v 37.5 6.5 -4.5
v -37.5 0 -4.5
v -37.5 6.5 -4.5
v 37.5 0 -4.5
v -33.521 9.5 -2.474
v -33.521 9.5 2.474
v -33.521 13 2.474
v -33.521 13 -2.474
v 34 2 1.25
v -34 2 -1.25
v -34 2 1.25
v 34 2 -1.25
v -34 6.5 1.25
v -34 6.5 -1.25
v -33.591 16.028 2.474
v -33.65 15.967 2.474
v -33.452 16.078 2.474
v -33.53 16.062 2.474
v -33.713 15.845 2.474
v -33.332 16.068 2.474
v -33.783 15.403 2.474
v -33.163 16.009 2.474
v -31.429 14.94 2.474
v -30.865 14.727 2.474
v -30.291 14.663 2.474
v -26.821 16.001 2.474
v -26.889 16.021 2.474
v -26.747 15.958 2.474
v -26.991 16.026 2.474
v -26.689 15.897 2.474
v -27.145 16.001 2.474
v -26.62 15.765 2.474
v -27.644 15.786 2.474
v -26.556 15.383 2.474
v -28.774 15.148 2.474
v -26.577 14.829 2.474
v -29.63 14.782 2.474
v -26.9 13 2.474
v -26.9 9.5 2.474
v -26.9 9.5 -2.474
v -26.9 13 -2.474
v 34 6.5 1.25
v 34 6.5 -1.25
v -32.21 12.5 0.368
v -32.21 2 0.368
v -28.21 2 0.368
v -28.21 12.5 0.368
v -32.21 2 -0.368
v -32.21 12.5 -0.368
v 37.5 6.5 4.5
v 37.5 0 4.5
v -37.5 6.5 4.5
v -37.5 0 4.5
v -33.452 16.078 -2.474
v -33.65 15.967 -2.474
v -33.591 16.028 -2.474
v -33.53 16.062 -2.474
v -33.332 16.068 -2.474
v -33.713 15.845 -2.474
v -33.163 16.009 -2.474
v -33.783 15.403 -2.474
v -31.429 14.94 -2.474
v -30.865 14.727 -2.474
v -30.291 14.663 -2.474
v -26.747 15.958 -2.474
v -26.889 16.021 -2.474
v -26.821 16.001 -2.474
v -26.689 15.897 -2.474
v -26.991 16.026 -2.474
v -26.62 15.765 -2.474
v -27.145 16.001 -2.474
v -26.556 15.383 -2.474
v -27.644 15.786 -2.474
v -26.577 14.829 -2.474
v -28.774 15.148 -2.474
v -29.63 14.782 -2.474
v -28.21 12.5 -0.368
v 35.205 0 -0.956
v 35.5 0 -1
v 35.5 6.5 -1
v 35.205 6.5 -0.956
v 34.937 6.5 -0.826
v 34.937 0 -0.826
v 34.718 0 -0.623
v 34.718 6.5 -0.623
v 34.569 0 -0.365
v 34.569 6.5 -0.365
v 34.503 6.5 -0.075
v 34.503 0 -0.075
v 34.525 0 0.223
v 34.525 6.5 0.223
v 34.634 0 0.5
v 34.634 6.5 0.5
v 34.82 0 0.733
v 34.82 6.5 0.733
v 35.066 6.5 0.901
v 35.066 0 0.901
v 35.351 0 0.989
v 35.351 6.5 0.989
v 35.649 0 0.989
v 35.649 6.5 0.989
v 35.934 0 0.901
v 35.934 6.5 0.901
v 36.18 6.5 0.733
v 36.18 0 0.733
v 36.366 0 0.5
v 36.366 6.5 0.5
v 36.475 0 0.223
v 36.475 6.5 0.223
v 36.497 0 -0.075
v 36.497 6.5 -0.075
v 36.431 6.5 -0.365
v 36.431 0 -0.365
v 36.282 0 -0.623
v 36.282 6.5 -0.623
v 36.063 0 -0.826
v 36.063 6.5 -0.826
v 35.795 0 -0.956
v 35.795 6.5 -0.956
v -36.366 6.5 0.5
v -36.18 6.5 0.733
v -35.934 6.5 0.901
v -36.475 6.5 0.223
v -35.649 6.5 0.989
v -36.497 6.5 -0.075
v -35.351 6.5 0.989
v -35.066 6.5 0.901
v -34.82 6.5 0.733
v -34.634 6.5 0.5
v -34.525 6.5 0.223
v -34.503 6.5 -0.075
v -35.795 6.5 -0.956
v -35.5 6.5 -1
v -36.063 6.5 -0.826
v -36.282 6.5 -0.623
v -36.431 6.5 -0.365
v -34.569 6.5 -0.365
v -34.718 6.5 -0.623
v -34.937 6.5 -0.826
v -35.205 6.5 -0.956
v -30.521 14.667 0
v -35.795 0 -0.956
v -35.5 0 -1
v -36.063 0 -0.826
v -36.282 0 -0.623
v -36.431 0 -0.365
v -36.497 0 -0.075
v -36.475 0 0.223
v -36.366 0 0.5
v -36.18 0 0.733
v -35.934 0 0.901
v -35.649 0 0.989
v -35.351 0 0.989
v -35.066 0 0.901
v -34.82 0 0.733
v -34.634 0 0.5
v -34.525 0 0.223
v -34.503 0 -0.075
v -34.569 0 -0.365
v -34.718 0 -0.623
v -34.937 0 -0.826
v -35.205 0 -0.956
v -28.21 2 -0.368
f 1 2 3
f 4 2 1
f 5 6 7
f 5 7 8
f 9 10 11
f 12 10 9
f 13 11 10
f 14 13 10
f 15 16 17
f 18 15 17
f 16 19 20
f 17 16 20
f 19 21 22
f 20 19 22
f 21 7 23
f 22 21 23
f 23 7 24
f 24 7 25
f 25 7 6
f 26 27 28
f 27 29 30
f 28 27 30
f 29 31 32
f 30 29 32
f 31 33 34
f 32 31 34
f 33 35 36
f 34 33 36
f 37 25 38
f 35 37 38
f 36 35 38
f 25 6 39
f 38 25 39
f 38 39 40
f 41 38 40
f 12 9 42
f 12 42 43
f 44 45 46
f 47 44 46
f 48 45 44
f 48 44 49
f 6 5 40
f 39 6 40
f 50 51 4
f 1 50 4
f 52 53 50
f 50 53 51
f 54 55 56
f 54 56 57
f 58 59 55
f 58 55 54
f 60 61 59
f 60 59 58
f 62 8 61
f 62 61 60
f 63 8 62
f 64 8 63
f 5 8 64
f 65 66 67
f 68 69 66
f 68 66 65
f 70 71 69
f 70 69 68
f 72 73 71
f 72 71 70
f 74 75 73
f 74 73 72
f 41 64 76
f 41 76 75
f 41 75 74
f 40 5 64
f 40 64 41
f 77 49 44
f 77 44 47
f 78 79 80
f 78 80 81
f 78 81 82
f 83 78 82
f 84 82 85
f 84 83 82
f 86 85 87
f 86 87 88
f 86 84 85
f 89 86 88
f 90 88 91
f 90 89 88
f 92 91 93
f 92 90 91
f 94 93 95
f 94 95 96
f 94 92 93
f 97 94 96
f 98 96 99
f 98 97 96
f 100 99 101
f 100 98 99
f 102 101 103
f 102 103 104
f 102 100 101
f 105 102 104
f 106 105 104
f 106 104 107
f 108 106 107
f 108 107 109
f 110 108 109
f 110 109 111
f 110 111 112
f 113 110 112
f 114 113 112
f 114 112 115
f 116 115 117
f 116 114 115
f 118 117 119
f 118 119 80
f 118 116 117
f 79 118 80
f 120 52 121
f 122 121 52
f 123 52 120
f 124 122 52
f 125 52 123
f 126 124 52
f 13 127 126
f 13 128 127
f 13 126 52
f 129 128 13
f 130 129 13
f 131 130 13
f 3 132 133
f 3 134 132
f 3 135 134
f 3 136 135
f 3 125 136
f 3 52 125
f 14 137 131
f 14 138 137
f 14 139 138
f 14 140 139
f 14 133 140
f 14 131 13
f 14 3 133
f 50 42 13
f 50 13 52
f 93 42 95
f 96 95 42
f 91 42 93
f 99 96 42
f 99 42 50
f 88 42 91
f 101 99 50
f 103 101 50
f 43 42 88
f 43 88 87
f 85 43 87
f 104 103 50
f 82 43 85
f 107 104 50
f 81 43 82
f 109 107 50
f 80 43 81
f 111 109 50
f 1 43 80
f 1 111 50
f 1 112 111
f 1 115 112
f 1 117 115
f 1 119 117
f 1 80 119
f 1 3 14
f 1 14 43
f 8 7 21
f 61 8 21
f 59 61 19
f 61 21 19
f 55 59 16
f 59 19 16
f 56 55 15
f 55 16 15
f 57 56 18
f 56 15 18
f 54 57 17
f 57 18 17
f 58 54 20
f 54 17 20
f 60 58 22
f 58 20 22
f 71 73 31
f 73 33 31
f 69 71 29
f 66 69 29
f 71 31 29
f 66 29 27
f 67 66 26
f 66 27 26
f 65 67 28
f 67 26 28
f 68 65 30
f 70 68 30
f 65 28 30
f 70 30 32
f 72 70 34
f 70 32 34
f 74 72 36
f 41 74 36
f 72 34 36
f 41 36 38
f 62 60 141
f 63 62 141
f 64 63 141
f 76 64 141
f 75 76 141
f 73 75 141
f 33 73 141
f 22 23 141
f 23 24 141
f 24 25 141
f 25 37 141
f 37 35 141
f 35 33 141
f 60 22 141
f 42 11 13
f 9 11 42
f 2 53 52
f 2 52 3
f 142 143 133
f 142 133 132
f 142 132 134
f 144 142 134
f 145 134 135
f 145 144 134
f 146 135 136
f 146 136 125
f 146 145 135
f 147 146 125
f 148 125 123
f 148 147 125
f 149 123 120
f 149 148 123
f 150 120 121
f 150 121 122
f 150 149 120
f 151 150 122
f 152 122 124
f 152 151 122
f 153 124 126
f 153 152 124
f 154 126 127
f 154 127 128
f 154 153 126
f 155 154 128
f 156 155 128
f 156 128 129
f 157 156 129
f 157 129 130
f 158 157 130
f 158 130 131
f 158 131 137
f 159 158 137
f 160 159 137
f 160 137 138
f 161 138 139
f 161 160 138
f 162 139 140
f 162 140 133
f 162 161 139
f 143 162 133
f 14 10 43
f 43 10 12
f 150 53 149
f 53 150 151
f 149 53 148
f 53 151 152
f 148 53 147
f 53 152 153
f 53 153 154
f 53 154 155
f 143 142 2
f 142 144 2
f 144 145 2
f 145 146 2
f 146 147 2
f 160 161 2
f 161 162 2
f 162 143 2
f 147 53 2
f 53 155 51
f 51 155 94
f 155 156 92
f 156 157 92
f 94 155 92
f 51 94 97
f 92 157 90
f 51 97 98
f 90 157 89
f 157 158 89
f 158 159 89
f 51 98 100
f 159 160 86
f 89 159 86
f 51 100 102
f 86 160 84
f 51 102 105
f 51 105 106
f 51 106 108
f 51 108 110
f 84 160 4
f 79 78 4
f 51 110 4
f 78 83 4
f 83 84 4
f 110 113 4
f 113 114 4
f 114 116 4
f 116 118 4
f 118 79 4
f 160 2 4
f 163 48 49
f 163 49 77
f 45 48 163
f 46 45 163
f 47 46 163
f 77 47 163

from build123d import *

# Parameters (mm, degrees)
SKETCH1_W                = 75
SKETCH1_H                = 9
SKETCH1_R                = 1
SKETCH1_W_2              = 68
SKETCH1_H_2              = 2.5
BOSS_EXTRUDE1_DEPTH      = 6.5
CUT_EXTRUDE1_START       = 2
SKETCH1_3_W              = 68
SKETCH1_3_H              = 2.5
CUT_EXTRUDE1_DEPTH       = 6.5
SKETCH2_W                = 4
SKETCH2_H                = 0.735412898
BOSS_EXTRUDE2_DEPTH      = 10.5
BOSS_EXTRUDE3_DEPTH      = 0.5
BOSS_EXTRUDE3_DEPTH_BACK = 3
SKETCH3_W                = 6.621243081
SKETCH3_H                = 4.94853177
SKETCH3_W_2              = 4
SKETCH3_H_2              = 0.735412898
BOSS_EXTRUDE4_DEPTH      = 4.948531769


with BuildPart() as part:
    # Sketch1 → Boss-Extrude1 (new body)
    # profile 1 of 2: a face of its own
    with BuildSketch(Plane(origin=(0, 0, 0), x_dir=(1, 0, 0), z_dir=(0, 1, 0))):
        Rectangle(SKETCH1_W, SKETCH1_H)
        with Locations(Location((35.5, 0, 0), (0, 0, 90))):
            Circle(SKETCH1_R, mode=Mode.SUBTRACT)
        with Locations(Location((-35.5, 0, 0), (0, 0, 90))):
            Circle(SKETCH1_R, mode=Mode.SUBTRACT)
        Rectangle(SKETCH1_W_2, SKETCH1_H_2, mode=Mode.SUBTRACT)
    # profile 2 of 2: a face of its own
    with BuildSketch(Plane(origin=(0, 0, 0), x_dir=(1, 0, 0), z_dir=(0, 1, 0))):
        Rectangle(SKETCH1_W_2, SKETCH1_H_2)
    extrude(amount=BOSS_EXTRUDE1_DEPTH)

    # Sketch1<3> → Cut-Extrude1 (cut)
    with BuildSketch(Plane(origin=(0, 0, 0), x_dir=(1, 0, 0), z_dir=(0, 1, 0)).offset(CUT_EXTRUDE1_START)):
        Rectangle(SKETCH1_3_W, SKETCH1_3_H)
    extrude(amount=CUT_EXTRUDE1_DEPTH, mode=Mode.SUBTRACT)


with BuildPart() as body_2:
    # Sketch2 → Boss-Extrude2 (new body)
    with BuildSketch(Plane(origin=(0, 2, 0), x_dir=(1, 0, 0), z_dir=(0, 1, 0))):
        with Locations((-30.210130629, 0)):
            Rectangle(SKETCH2_W, SKETCH2_H)
    extrude(amount=BOSS_EXTRUDE2_DEPTH)


with BuildPart() as body_3:
    # Sketch3 → Boss-Extrude3 (new, two sides: drawn at the far end of the back side and taken through both)
    # profile 1 of 2: a face of its own
    with BuildSketch(Plane(origin=(0, 12.5, 0), x_dir=(1, 0, 0), z_dir=(0, 1, 0)).offset(-BOSS_EXTRUDE3_DEPTH_BACK)):
        with Locations((-30.21013063, 0)):
            Rectangle(SKETCH3_W, SKETCH3_H)
        with Locations((-30.210130629, 0)):
            Rectangle(SKETCH3_W_2, SKETCH3_H_2, mode=Mode.SUBTRACT)
    # profile 2 of 2: a face of its own
    with BuildSketch(Plane(origin=(0, 12.5, 0), x_dir=(1, 0, 0), z_dir=(0, 1, 0)).offset(-BOSS_EXTRUDE3_DEPTH_BACK)):
        with Locations((-30.210130629, 0)):
            Rectangle(SKETCH3_W_2, SKETCH3_H_2)
    extrude(amount=BOSS_EXTRUDE3_DEPTH + BOSS_EXTRUDE3_DEPTH_BACK)

    # Sketch5 → Boss-Extrude4 (add)
    with BuildSketch(Plane.XY.offset(2.474265885)):
        with BuildLine():
            Line((-26.899509089, 9.5), (-26.899509089, 13))
            add(Edge.make_bspline(
                [(-33.52075217, 13), (-34.496425633, 18.64140336), (-30.523211951, 10.611035824), (-25.604321262, 18.774566382), (-26.899509089, 13)],
                knots=[0, 0, 0, 0, 0.47361504, 1, 1, 1, 1], degree=3))
            Line((-33.52075217, 13), (-33.52075217, 9.5))
            Line((-33.52075217, 9.5), (-26.899509089, 9.5))
        make_face()
    extrude(amount=-BOSS_EXTRUDE4_DEPTH)


solid = Compound([part.part, body_2.part, body_3.part])
